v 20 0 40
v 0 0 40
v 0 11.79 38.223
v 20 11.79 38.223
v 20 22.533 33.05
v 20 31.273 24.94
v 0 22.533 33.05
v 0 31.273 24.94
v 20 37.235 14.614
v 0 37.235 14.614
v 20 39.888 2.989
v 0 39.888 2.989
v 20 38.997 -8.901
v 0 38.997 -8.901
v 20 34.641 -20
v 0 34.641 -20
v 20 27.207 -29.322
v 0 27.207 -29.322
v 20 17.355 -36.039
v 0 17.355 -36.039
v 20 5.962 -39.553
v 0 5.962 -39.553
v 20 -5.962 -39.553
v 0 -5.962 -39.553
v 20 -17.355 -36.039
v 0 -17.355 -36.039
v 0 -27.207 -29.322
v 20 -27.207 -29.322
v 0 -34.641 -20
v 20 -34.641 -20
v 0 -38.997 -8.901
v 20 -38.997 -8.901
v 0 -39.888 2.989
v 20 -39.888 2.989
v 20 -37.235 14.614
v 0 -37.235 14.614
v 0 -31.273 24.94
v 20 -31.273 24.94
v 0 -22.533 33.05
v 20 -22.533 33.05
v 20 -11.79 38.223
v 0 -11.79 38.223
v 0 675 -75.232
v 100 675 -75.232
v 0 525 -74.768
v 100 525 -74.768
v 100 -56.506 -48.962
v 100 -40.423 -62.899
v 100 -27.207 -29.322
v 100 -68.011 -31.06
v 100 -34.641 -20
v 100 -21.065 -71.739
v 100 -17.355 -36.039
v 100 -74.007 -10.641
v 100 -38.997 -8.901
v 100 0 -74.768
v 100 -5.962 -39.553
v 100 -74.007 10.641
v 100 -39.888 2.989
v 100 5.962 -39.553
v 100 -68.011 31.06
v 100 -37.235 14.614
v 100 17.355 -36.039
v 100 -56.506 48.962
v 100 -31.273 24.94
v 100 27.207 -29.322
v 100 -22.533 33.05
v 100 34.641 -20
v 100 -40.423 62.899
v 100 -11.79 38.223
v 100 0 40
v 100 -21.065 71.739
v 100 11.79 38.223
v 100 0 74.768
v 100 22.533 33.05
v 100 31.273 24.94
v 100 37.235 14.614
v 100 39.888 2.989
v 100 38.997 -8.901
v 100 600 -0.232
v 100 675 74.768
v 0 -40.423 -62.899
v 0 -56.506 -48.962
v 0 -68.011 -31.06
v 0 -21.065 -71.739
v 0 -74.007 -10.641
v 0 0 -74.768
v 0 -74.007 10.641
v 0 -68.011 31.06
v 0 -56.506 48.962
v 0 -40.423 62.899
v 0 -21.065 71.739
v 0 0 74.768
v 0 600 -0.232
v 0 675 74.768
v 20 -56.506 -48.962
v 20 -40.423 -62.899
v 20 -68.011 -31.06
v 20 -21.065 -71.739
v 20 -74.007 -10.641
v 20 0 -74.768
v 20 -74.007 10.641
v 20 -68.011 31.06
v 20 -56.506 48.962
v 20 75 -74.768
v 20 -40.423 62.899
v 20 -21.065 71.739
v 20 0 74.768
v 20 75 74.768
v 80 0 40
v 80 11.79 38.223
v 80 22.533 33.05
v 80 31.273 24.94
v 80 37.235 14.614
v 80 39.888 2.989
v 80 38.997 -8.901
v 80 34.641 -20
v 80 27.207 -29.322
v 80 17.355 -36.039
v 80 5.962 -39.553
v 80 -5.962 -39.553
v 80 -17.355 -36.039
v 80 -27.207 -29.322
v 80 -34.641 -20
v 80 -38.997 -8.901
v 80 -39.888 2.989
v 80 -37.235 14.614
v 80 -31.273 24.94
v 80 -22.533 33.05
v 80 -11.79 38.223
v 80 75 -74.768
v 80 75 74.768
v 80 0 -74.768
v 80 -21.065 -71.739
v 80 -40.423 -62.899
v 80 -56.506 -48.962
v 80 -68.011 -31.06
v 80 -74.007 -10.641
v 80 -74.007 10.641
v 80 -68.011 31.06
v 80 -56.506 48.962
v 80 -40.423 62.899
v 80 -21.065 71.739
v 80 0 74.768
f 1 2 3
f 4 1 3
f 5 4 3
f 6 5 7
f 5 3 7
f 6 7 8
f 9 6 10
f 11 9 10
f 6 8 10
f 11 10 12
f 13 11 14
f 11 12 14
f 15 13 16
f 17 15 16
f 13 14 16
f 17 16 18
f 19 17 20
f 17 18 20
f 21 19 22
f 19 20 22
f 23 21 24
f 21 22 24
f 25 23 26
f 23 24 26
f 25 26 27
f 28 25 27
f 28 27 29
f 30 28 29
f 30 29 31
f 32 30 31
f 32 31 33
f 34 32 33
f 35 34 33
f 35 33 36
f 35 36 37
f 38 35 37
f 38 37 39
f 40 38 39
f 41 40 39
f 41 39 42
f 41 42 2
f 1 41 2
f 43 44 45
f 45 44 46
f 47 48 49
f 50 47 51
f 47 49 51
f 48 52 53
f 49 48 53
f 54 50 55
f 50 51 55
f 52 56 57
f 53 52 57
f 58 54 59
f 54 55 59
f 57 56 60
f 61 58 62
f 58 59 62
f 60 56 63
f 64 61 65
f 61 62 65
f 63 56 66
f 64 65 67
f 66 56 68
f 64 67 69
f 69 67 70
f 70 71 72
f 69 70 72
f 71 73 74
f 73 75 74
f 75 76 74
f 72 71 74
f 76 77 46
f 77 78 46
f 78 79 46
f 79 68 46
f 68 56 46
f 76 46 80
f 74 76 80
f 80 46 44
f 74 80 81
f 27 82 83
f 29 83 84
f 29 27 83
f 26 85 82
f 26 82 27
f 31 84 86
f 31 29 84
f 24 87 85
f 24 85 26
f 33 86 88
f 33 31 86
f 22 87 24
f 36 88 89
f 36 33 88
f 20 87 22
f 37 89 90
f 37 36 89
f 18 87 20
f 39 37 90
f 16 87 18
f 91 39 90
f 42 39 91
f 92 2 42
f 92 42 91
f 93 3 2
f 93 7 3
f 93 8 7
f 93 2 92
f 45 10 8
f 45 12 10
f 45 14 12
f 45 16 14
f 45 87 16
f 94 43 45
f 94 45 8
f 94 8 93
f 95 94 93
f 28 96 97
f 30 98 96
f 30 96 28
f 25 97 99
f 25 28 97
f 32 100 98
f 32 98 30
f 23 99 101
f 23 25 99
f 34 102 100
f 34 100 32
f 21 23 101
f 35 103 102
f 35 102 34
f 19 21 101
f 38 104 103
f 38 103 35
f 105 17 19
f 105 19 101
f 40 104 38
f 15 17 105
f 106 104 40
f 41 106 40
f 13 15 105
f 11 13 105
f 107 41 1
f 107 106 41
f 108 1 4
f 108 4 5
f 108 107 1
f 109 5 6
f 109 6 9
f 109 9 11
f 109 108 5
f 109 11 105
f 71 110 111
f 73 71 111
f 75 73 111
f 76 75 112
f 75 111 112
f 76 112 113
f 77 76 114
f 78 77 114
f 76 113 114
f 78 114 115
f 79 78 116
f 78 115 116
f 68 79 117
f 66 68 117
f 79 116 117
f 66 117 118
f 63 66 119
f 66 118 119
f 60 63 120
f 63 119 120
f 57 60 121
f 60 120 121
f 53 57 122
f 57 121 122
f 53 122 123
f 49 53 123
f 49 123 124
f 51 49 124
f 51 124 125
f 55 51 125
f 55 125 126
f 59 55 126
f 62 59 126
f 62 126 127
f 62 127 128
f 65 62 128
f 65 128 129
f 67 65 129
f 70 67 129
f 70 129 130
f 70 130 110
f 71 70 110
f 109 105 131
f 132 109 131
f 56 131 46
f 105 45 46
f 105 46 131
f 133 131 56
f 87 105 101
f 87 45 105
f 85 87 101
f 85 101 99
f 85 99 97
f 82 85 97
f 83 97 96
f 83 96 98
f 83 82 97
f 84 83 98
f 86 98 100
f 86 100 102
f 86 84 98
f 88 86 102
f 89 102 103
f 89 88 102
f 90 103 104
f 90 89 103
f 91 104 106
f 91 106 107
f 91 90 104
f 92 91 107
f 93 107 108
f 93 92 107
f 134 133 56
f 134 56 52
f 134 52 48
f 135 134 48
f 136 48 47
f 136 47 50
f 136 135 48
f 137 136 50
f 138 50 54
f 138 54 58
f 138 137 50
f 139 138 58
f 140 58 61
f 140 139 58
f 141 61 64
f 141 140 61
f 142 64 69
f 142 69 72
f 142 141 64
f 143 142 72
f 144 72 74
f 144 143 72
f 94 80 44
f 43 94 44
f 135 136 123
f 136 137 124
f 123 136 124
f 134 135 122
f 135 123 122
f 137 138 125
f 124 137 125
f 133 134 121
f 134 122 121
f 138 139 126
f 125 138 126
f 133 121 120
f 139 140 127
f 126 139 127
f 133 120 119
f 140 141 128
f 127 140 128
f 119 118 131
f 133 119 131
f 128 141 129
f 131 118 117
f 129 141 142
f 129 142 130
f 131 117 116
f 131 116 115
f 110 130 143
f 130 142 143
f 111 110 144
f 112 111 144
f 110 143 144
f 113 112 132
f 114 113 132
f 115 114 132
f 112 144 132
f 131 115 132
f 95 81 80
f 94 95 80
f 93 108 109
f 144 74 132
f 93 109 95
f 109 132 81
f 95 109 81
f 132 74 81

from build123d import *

# Parameters (mm, degrees)
BOSS_EXTRUDE1_DEPTH = 100
CUT_EXTRUDE2_DEPTH  = 20
CUT_EXTRUDE3_START  = -20
CUT_EXTRUDE3_DEPTH  = 20
SKETCH10_R          = 40
BOSS_EXTRUDE6_DEPTH = 20
BOSS_EXTRUDE7_START = 20
SKETCH11_R          = 40
BOSS_EXTRUDE7_DEPTH = 20
SKETCH19_R          = 40
CUT_EXTRUDE7_DEPTH  = 285
SKETCH16_W          = 60
SKETCH16_H          = 150
CUT_EXTRUDE8_DEPTH  = 285
SKETCH20_W          = 100
SKETCH20_H          = 295.959975124
CUT_EXTRUDE9_DEPTH  = 285
BOSS_EXTRUDE8_DEPTH = 100


with BuildPart() as part:
    # Sketch1 → Boss-Extrude1 (new body)
    with BuildSketch(Plane(origin=(0, 0, 0), x_dir=(0, 0, -1), z_dir=(1, 0, 0))):
        with BuildLine():
            Line((-74.767803634, 0), (-74.767803634, 600))
            ThreePointArc((-74.767803634, 600), (0, 674.767803634), (74.767803634, 600))
            Line((74.767803634, 600), (74.767803634, 0))
            ThreePointArc((74.767803634, 0), (0, -74.767803634), (-74.767803634, 0))
        make_face()
    extrude(amount=BOSS_EXTRUDE1_DEPTH)

    # Sketch8 → Cut-Extrude2 (cut)
    with BuildSketch(Plane.ZY):
        with BuildLine():
            Line((-74.767803634, 600), (-74.767803634, 525))
            Line((-74.767803634, 525), (74.767803634, 525))
            Line((74.767803634, 525), (74.767803634, 600))
            ThreePointArc((74.767803634, 600), (0, 674.767803634), (-74.767803634, 600))
        make_face()
    extrude(amount=-CUT_EXTRUDE2_DEPTH, mode=Mode.SUBTRACT)

    # Sketch7 → Cut-Extrude3 (cut)
    with BuildSketch(Plane(origin=(100, 0, 0), x_dir=(0, 0, -1), z_dir=(1, 0, 0)).offset(CUT_EXTRUDE3_START)):
        with BuildLine():
            Line((-74.767803634, 600), (-74.767803634, 525))
            Line((-74.767803634, 525), (74.767803634, 525))
            Line((74.767803634, 525), (74.767803634, 600))
            ThreePointArc((74.767803634, 600), (0, 674.767803634), (-74.767803634, 600))
        make_face()
    extrude(amount=CUT_EXTRUDE3_DEPTH, mode=Mode.SUBTRACT)

    # Sketch10 → Boss-Extrude6 (add)
    with BuildSketch(Plane(origin=(80, 0, 0), x_dir=(0, 0, -1), z_dir=(1, 0, 0))):
        with Locations(Location((0, 600, 0), (0, 0, 180))):
            Circle(SKETCH10_R)
    extrude(amount=BOSS_EXTRUDE6_DEPTH)

    # Sketch11 → Boss-Extrude7 (add)
    with BuildSketch(Plane.ZY.offset(-20).offset(BOSS_EXTRUDE7_START)):
        with Locations((0, 600)):
            Circle(SKETCH11_R)
    extrude(amount=-BOSS_EXTRUDE7_DEPTH)

    # Sketch19 → Cut-Extrude7 (cut)
    with BuildSketch(Plane.ZY):
        Circle(SKETCH19_R)
    extrude(amount=-CUT_EXTRUDE7_DEPTH, mode=Mode.SUBTRACT)

    # Sketch16 → Cut-Extrude8 (cut)
    with BuildSketch(Plane.XY.offset(74.767803634)):
        with Locations((50, 0)):
            Rectangle(SKETCH16_W, SKETCH16_H)
    extrude(amount=-CUT_EXTRUDE8_DEPTH, mode=Mode.SUBTRACT)

    # Sketch20 → Cut-Extrude9 (cut)
    with BuildSketch(Plane.XY.offset(74.767803634)):
        with Locations((50, 672.979987562)):
            Rectangle(SKETCH20_W, SKETCH20_H)
    extrude(amount=-CUT_EXTRUDE9_DEPTH, mode=Mode.SUBTRACT)

    # Sketch21 → Boss-Extrude8 (add)
    with BuildSketch(Plane(origin=(100, 0, 0), x_dir=(0, 0, -1), z_dir=(1, 0, 0))):
        Polygon((-74.767803634, 525), (-74.767803634, 675), (0.232196366, 600), (75.232196366, 675), (74.767803634, 525), align=None)
    extrude(amount=-BOSS_EXTRUDE8_DEPTH)


solid = part.part
